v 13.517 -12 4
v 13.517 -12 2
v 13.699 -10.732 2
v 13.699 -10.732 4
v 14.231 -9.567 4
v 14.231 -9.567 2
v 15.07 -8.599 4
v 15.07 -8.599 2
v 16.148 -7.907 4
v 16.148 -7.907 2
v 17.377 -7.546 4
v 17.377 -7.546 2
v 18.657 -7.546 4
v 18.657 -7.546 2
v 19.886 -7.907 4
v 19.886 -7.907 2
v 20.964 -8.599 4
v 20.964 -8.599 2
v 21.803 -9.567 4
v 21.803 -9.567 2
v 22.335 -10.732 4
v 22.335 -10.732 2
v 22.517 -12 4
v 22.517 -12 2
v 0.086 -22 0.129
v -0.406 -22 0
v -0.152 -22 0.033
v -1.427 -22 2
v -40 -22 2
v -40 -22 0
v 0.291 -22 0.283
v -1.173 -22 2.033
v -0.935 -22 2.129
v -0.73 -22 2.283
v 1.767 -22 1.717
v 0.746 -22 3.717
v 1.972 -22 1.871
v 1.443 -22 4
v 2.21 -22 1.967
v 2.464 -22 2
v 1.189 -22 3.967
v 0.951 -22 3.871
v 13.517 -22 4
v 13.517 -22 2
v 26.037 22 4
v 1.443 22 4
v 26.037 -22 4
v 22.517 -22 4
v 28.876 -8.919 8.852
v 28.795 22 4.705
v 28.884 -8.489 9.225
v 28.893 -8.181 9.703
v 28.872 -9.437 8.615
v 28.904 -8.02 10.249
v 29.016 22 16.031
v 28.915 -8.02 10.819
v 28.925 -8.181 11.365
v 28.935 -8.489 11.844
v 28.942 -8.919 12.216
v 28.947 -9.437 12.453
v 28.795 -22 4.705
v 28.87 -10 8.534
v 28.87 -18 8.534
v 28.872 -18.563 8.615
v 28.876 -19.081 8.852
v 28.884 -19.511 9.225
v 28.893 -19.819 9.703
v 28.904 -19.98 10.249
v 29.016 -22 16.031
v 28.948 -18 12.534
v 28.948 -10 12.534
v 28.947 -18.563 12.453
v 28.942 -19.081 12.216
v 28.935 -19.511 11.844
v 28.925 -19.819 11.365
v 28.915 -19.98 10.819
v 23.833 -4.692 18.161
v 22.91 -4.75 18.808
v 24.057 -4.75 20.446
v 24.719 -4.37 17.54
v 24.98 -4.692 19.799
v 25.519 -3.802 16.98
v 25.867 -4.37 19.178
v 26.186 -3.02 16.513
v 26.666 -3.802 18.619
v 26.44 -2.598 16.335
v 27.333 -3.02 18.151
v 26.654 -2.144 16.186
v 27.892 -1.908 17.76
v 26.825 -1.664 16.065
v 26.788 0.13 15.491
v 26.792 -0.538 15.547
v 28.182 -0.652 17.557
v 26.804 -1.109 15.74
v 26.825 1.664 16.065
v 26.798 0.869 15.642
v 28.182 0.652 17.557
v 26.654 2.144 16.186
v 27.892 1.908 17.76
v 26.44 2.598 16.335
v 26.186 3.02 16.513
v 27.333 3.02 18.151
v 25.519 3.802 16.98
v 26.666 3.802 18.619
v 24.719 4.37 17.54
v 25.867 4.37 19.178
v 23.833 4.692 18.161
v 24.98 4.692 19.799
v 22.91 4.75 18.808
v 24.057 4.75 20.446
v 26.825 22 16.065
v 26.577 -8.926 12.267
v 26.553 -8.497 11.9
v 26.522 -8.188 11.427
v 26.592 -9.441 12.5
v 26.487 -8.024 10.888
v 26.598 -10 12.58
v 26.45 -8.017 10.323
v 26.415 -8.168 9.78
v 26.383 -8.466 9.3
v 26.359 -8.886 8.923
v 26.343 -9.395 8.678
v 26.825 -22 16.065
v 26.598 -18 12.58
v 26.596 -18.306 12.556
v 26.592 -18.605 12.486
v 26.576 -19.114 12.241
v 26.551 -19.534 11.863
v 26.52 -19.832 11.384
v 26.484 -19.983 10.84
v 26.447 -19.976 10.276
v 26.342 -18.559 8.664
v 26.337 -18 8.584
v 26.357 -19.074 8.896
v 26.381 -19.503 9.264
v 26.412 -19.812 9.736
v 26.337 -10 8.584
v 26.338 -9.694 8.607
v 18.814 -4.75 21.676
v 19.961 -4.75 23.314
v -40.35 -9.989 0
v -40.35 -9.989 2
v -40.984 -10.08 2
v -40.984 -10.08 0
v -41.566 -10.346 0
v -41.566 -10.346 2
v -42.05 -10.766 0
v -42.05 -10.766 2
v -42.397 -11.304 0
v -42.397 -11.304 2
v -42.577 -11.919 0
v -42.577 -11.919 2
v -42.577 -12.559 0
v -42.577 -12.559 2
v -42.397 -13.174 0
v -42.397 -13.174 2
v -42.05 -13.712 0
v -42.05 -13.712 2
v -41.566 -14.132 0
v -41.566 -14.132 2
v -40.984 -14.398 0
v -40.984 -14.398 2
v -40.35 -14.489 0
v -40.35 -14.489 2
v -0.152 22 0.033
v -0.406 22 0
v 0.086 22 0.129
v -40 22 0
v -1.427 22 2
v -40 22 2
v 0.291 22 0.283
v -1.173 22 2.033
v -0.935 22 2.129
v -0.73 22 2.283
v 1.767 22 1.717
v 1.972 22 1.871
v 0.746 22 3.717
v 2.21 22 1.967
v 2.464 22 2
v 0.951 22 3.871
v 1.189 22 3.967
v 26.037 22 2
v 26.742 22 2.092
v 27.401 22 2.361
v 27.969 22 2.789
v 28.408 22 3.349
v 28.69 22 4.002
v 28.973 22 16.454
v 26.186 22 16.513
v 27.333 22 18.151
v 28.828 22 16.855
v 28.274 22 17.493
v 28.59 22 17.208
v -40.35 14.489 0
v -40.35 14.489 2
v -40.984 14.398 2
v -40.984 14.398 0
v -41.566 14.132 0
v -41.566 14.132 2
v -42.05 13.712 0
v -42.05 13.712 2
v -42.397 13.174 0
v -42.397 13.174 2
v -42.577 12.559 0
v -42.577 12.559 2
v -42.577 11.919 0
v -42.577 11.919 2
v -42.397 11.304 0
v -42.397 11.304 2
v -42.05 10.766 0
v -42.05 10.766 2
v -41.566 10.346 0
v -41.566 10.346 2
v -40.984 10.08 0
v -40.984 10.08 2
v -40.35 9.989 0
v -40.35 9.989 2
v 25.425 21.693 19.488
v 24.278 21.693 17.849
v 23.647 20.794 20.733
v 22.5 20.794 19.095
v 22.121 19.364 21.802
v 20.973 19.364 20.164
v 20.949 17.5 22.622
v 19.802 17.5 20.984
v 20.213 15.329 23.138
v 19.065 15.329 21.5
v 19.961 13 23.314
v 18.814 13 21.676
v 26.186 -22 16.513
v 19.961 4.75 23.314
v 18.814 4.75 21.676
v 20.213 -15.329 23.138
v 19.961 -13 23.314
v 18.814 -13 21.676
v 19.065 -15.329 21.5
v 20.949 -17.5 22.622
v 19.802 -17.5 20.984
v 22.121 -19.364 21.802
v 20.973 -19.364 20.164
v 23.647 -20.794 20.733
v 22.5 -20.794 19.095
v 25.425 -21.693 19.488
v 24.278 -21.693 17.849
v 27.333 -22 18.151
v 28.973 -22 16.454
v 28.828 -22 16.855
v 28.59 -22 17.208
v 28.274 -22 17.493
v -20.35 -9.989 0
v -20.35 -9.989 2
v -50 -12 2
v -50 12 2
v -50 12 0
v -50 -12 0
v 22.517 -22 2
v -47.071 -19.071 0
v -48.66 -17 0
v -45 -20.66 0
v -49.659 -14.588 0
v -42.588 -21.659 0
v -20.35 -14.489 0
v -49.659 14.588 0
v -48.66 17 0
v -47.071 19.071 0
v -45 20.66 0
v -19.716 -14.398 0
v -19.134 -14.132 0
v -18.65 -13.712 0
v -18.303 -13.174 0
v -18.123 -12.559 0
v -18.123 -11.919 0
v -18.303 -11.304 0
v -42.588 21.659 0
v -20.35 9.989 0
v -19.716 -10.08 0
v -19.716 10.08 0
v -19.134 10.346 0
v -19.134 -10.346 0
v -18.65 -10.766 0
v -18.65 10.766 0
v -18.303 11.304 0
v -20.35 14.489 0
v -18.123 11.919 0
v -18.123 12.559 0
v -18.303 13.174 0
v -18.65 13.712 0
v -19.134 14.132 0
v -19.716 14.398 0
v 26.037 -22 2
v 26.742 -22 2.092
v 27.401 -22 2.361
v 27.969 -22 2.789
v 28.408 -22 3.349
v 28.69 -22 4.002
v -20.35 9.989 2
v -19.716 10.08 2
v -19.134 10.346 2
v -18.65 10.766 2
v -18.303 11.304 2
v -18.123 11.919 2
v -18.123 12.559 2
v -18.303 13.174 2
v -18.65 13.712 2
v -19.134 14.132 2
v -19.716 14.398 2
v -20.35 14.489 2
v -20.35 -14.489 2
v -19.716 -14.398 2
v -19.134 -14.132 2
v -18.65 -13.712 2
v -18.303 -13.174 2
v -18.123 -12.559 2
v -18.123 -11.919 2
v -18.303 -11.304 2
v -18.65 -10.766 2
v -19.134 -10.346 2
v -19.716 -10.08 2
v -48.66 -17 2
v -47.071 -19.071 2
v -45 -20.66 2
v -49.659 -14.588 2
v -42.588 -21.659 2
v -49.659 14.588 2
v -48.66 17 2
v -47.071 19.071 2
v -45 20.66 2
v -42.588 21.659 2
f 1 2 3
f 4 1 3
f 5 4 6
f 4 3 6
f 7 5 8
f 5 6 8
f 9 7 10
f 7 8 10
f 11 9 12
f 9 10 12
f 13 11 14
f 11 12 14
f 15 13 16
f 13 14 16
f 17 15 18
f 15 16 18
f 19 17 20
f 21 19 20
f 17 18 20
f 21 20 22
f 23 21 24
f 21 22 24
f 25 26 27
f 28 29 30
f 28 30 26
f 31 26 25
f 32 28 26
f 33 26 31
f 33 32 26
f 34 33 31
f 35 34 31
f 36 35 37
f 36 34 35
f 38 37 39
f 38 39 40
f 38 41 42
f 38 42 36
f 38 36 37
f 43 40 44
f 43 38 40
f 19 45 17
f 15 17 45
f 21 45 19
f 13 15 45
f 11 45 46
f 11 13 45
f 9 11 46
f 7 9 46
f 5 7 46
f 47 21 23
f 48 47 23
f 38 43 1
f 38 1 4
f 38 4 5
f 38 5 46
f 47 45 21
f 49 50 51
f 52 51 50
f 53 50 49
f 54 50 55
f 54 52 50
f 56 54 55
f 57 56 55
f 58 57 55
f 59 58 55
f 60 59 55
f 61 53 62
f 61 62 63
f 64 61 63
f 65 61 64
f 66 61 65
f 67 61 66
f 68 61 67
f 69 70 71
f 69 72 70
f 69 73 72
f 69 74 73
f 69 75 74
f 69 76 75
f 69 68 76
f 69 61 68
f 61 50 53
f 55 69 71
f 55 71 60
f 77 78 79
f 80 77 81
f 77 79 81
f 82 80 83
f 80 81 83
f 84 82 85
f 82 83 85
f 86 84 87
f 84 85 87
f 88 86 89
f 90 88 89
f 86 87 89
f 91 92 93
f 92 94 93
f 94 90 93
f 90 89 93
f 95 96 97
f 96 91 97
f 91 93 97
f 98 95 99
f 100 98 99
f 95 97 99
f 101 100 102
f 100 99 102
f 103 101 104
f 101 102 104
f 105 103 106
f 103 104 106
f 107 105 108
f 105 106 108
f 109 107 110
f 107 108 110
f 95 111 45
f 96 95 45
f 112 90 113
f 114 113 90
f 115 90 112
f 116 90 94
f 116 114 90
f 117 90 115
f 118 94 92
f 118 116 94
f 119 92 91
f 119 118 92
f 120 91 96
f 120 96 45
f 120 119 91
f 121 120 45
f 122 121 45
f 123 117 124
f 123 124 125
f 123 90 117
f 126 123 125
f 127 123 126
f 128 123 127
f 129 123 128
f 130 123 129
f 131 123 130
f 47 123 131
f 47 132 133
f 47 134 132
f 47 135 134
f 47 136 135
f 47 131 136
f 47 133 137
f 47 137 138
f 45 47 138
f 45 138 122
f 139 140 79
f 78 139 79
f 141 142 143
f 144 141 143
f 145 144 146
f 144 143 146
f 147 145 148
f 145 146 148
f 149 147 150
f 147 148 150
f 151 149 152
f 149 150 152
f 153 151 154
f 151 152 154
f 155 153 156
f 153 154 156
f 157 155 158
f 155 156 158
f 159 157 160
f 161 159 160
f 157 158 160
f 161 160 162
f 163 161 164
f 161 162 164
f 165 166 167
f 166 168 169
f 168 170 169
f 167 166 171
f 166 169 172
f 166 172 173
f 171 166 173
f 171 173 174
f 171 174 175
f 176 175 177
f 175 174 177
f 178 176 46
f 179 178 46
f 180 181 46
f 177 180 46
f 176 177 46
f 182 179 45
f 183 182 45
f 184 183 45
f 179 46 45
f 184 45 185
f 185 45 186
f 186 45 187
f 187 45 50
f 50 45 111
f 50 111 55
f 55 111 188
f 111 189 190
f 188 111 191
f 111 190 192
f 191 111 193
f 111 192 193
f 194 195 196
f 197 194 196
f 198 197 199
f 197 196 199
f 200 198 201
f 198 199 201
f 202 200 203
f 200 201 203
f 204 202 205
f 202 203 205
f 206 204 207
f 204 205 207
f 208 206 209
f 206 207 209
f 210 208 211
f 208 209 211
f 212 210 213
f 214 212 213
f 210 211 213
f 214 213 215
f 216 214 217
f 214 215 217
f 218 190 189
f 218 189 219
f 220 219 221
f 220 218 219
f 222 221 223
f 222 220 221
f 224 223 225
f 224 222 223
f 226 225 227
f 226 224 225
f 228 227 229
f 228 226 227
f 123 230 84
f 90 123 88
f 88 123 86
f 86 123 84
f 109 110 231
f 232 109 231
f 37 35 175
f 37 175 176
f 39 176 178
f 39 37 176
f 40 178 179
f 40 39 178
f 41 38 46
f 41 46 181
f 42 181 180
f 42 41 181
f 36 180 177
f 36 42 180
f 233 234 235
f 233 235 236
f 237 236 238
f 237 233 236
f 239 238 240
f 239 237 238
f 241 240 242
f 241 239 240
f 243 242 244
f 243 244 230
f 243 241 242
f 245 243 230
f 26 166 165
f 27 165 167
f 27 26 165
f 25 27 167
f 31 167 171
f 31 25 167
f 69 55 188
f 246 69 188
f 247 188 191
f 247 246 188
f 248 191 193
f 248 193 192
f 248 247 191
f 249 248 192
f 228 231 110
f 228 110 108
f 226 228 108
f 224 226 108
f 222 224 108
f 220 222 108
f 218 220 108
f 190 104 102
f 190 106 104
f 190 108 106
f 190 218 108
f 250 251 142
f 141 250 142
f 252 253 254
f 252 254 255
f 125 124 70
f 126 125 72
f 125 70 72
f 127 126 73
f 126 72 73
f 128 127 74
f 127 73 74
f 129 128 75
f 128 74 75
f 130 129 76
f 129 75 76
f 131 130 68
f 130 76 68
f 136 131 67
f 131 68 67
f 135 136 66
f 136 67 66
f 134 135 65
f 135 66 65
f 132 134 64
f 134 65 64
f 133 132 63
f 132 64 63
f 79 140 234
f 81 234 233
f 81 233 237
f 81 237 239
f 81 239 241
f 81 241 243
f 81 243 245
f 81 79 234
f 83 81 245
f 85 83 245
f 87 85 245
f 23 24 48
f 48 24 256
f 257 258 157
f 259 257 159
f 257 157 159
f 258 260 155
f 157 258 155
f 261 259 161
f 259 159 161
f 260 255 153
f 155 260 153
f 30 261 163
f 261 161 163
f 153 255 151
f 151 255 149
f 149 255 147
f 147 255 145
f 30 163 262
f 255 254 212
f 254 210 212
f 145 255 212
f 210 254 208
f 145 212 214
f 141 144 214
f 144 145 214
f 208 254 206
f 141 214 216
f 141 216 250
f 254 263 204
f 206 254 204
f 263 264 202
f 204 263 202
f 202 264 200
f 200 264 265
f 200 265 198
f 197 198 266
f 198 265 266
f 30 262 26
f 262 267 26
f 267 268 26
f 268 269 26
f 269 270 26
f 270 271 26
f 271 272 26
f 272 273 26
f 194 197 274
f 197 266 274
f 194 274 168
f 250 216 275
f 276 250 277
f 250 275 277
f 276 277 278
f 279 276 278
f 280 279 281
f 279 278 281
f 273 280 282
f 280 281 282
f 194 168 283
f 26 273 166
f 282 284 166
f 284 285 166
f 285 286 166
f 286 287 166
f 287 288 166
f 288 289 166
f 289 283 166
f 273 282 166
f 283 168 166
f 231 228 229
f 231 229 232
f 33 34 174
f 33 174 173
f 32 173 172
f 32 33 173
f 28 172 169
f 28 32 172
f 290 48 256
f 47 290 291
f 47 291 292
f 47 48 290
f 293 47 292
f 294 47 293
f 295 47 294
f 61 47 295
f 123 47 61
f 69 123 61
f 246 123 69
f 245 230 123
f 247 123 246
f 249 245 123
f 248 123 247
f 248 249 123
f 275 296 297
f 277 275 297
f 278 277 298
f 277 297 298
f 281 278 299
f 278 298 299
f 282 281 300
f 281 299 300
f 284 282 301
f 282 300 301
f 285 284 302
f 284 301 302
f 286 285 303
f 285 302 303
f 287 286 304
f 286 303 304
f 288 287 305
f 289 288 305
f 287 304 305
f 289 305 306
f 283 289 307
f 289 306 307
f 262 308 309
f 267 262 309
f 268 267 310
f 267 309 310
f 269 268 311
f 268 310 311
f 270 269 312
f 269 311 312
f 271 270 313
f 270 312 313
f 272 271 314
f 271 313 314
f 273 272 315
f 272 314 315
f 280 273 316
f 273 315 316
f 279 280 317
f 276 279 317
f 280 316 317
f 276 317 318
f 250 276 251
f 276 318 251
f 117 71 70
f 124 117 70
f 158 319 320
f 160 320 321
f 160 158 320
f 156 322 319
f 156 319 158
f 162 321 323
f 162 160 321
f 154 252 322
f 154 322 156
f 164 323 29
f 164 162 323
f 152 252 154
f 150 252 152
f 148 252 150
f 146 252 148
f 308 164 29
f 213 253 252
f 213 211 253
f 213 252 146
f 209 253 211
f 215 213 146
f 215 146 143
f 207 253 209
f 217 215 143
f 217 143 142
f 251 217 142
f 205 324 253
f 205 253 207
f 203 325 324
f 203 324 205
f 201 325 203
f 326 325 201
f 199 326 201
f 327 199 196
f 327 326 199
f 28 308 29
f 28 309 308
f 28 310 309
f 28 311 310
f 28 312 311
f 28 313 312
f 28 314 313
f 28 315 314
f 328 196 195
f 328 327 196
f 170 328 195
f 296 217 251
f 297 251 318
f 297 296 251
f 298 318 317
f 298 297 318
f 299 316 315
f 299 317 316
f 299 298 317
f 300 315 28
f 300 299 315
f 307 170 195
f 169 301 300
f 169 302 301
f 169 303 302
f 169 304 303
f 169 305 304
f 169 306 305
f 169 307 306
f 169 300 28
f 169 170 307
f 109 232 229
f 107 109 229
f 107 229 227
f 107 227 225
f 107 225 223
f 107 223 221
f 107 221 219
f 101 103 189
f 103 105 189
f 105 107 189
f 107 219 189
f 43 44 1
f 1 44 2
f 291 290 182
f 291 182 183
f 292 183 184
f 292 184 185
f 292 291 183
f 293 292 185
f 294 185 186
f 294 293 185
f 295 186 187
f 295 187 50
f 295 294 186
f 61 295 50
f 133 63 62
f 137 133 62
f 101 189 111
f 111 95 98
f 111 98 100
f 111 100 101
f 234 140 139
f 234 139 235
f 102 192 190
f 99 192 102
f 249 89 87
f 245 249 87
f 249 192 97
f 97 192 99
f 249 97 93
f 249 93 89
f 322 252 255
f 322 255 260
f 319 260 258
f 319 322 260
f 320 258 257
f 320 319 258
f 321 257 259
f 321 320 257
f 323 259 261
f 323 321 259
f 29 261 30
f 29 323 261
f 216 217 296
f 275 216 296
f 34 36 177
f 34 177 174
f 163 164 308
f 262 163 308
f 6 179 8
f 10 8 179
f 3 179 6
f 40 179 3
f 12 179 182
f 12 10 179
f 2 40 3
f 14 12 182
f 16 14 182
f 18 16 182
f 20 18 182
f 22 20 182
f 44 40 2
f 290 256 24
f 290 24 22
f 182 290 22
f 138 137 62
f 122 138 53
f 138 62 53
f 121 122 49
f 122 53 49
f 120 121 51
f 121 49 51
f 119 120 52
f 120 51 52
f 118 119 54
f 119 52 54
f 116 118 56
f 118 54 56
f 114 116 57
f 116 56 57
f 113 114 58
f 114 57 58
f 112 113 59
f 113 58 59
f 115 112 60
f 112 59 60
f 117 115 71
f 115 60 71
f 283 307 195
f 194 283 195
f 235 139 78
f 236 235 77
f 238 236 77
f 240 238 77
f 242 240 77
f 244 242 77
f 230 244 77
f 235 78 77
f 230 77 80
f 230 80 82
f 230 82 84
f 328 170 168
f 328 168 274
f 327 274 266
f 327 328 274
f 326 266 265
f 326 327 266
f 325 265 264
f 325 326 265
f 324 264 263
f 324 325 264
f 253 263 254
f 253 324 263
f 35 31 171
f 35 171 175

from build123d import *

# Parameters (mm, degrees)
F1_DEPTH  = 22
F3_DEPTH  = 2
F5_DEPTH  = 25
F7_DEPTH  = 25
F9_DEPTH  = 2
F11_DEPTH = 2.4954547296
F13_DEPTH = 2
F14_DEPTH = 25


# Not quite as in the source:
# - a feature names something its author has since deleted; it is built from what else it names


with BuildPart() as f1:
    # F0 (on Front) → F1 (new body, symmetric)
    with BuildSketch(Plane.XZ):
        with BuildLine():
            Line((-40, 0), (-0.4058661959, 0))
            ThreePointArc((-0.4058661959, 0), (-0.0297944203, 0.073409465), (0.2910628996, 0.2828599608))
            Line((0.2910628996, 0.2828599608), (1.7669371004, 1.7171400392))
            ThreePointArc((1.7669371004, 1.7171400392), (2.0877944203, 1.926590535), (2.4638661959, 2))
            Line((2.4638661959, 2), (26.037, 2))
            ThreePointArc((26.037, 2), (27.9687843496, 2.7891547709), (28.7954749436, 4.705176349))
            Line((28.7954749436, 4.705176349), (29.016465998, 16.0310205539))
            ThreePointArc((29.016465998, 16.0310205539), (28.8276722638, 16.8546583092), (28.2736767263, 17.4927109486))
            Line((28.2736767263, 17.4927109486), (27.3333525812, 18.1512658075))
            Line((27.3333525812, 18.1512658075), (26.1860444646, 16.5130704329))
            Line((26.1860444646, 16.5130704329), (26.8254471929, 16.0652655182))
            Line((26.8254471929, 16.0652655182), (26.037, 4))
            Line((26.037, 4), (1.4428661959, 4))
            ThreePointArc((1.4428661959, 4), (1.0667944203, 3.926590535), (0.7459371004, 3.7171400392))
            Line((0.7459371004, 3.7171400392), (-0.7299371004, 2.2828599608))
            ThreePointArc((-0.7299371004, 2.2828599608), (-1.0507944203, 2.073409465), (-1.4268661959, 2))
            Line((-1.4268661959, 2), (-40, 2))
            Line((-40, 2), (-40, 0))
        make_face()
    extrude(amount=F1_DEPTH, both=True)

    # F2 (on face) → F3 (join)
    with BuildSketch(Plane.XY.offset(2)):
        with BuildLine():
            Line((-50, 12), (-50, -12))
            ThreePointArc((-50, -12), (-47.0710678119, -19.0710678119), (-40, -22))
            Line((-40, -22), (-40, 22))
            ThreePointArc((-40, 22), (-47.0710678119, 19.0710678119), (-50, 12))
        make_face()
    extrude(amount=-F3_DEPTH)

    # F4 (on face) → F5 (cut)
    with BuildSketch(Plane.XY.offset(2)):
        with BuildLine():
            ThreePointArc((-40.35, 14.489), (-42.6, 12.239), (-40.35, 9.989))
            Line((-40.35, 9.989), (-20.35, 9.989))
            ThreePointArc((-20.35, 9.989), (-18.1, 12.239), (-20.35, 14.489))
            Line((-20.35, 14.489), (-40.35, 14.489))
        make_face()
    extrude(amount=-F5_DEPTH, mode=Mode.SUBTRACT)

    # F6 (on face) → F7 (cut)
    with BuildSketch(Plane(origin=(28.6927430868, 0, -0.5598557981), x_dir=(0, 1, 0), z_dir=(0.9998096932, 0, -0.0195083911))):
        with BuildLine():
            Line((-9.9999997095, 13.096034309), (-17.9999997095, 13.096034309))
            ThreePointArc((-17.9999997095, 13.096034309), (-20, 11.0960344543), (-18, 9.096034309))
            Line((-18, 9.096034309), (-9.9999997095, 9.096034309))
            ThreePointArc((-9.9999997095, 9.096034309), (-7.9999997095, 11.096034309), (-9.9999997095, 13.096034309))
        make_face()
    extrude(amount=-F7_DEPTH, mode=Mode.SUBTRACT)

    # F8 (on face) → F9 (join)
    with BuildSketch(Plane(origin=(17.5237251574, 0, 25.0214263138), x_dir=(0.8190976873, 0, -0.5736540583), z_dir=(0.5736540583, 0, 0.8190976873))):
        with BuildLine():
            Line((2.9761385921, 13), (2.9761385921, -13))
            ThreePointArc((2.9761385921, -13), (5.6121775614, -19.3639610307), (11.9761385921, -22))
            Line((11.9761385921, -22), (11.9761385921, 22))
            ThreePointArc((11.9761385921, 22), (5.6121775614, 19.3639610307), (2.9761385921, 13))
        make_face()
    extrude(amount=-F9_DEPTH)

    # F10 (on face) → F11 (cut, through all)
    with BuildSketch(Plane(origin=(17.5237251574, 0, 25.0214263138), x_dir=(0.8190976873, 0, -0.5736540583), z_dir=(0.5736540583, 0, 0.8190976873))):
        with BuildLine():
            Line((2.9761385921, 4.75), (2.9761385921, -4.75))
            Line((2.9761385921, -4.75), (7.9761385921, -4.75))
            ThreePointArc((7.9761385921, -4.75), (13.0569949576, 0), (7.9761385921, 4.75))
            Line((7.9761385921, 4.75), (2.9761385921, 4.75))
        make_face()
    extrude(amount=-F11_DEPTH, mode=Mode.SUBTRACT)

    # F12 (on face) → F13 (cut, through all)
    with BuildSketch(Plane(origin=(0, 0, 2), x_dir=(1, 0, 0), z_dir=(0, 0, -1))):
        with BuildLine():
            Line((22.517, 12), (22.517, 22))
            Line((22.517, 22), (13.517, 22))
            Line((13.517, 22), (13.517, 12))
            ThreePointArc((13.517, 12), (18.017, 7.5), (22.517, 12))
        make_face()
    extrude(amount=-F13_DEPTH, mode=Mode.SUBTRACT)

    # F4 (on face) → F14 (cut)
    with BuildSketch(Plane.XY.offset(2)):
        with BuildLine():
            Line((-20.35, -9.989), (-40.35, -9.989))
            ThreePointArc((-40.35, -9.989), (-42.6, -12.239), (-40.35, -14.489))
            Line((-40.35, -14.489), (-20.35, -14.489))
            ThreePointArc((-20.35, -14.489), (-18.1, -12.239), (-20.35, -9.989))
        make_face()
    extrude(amount=-F14_DEPTH, mode=Mode.SUBTRACT)


solid = f1.part
